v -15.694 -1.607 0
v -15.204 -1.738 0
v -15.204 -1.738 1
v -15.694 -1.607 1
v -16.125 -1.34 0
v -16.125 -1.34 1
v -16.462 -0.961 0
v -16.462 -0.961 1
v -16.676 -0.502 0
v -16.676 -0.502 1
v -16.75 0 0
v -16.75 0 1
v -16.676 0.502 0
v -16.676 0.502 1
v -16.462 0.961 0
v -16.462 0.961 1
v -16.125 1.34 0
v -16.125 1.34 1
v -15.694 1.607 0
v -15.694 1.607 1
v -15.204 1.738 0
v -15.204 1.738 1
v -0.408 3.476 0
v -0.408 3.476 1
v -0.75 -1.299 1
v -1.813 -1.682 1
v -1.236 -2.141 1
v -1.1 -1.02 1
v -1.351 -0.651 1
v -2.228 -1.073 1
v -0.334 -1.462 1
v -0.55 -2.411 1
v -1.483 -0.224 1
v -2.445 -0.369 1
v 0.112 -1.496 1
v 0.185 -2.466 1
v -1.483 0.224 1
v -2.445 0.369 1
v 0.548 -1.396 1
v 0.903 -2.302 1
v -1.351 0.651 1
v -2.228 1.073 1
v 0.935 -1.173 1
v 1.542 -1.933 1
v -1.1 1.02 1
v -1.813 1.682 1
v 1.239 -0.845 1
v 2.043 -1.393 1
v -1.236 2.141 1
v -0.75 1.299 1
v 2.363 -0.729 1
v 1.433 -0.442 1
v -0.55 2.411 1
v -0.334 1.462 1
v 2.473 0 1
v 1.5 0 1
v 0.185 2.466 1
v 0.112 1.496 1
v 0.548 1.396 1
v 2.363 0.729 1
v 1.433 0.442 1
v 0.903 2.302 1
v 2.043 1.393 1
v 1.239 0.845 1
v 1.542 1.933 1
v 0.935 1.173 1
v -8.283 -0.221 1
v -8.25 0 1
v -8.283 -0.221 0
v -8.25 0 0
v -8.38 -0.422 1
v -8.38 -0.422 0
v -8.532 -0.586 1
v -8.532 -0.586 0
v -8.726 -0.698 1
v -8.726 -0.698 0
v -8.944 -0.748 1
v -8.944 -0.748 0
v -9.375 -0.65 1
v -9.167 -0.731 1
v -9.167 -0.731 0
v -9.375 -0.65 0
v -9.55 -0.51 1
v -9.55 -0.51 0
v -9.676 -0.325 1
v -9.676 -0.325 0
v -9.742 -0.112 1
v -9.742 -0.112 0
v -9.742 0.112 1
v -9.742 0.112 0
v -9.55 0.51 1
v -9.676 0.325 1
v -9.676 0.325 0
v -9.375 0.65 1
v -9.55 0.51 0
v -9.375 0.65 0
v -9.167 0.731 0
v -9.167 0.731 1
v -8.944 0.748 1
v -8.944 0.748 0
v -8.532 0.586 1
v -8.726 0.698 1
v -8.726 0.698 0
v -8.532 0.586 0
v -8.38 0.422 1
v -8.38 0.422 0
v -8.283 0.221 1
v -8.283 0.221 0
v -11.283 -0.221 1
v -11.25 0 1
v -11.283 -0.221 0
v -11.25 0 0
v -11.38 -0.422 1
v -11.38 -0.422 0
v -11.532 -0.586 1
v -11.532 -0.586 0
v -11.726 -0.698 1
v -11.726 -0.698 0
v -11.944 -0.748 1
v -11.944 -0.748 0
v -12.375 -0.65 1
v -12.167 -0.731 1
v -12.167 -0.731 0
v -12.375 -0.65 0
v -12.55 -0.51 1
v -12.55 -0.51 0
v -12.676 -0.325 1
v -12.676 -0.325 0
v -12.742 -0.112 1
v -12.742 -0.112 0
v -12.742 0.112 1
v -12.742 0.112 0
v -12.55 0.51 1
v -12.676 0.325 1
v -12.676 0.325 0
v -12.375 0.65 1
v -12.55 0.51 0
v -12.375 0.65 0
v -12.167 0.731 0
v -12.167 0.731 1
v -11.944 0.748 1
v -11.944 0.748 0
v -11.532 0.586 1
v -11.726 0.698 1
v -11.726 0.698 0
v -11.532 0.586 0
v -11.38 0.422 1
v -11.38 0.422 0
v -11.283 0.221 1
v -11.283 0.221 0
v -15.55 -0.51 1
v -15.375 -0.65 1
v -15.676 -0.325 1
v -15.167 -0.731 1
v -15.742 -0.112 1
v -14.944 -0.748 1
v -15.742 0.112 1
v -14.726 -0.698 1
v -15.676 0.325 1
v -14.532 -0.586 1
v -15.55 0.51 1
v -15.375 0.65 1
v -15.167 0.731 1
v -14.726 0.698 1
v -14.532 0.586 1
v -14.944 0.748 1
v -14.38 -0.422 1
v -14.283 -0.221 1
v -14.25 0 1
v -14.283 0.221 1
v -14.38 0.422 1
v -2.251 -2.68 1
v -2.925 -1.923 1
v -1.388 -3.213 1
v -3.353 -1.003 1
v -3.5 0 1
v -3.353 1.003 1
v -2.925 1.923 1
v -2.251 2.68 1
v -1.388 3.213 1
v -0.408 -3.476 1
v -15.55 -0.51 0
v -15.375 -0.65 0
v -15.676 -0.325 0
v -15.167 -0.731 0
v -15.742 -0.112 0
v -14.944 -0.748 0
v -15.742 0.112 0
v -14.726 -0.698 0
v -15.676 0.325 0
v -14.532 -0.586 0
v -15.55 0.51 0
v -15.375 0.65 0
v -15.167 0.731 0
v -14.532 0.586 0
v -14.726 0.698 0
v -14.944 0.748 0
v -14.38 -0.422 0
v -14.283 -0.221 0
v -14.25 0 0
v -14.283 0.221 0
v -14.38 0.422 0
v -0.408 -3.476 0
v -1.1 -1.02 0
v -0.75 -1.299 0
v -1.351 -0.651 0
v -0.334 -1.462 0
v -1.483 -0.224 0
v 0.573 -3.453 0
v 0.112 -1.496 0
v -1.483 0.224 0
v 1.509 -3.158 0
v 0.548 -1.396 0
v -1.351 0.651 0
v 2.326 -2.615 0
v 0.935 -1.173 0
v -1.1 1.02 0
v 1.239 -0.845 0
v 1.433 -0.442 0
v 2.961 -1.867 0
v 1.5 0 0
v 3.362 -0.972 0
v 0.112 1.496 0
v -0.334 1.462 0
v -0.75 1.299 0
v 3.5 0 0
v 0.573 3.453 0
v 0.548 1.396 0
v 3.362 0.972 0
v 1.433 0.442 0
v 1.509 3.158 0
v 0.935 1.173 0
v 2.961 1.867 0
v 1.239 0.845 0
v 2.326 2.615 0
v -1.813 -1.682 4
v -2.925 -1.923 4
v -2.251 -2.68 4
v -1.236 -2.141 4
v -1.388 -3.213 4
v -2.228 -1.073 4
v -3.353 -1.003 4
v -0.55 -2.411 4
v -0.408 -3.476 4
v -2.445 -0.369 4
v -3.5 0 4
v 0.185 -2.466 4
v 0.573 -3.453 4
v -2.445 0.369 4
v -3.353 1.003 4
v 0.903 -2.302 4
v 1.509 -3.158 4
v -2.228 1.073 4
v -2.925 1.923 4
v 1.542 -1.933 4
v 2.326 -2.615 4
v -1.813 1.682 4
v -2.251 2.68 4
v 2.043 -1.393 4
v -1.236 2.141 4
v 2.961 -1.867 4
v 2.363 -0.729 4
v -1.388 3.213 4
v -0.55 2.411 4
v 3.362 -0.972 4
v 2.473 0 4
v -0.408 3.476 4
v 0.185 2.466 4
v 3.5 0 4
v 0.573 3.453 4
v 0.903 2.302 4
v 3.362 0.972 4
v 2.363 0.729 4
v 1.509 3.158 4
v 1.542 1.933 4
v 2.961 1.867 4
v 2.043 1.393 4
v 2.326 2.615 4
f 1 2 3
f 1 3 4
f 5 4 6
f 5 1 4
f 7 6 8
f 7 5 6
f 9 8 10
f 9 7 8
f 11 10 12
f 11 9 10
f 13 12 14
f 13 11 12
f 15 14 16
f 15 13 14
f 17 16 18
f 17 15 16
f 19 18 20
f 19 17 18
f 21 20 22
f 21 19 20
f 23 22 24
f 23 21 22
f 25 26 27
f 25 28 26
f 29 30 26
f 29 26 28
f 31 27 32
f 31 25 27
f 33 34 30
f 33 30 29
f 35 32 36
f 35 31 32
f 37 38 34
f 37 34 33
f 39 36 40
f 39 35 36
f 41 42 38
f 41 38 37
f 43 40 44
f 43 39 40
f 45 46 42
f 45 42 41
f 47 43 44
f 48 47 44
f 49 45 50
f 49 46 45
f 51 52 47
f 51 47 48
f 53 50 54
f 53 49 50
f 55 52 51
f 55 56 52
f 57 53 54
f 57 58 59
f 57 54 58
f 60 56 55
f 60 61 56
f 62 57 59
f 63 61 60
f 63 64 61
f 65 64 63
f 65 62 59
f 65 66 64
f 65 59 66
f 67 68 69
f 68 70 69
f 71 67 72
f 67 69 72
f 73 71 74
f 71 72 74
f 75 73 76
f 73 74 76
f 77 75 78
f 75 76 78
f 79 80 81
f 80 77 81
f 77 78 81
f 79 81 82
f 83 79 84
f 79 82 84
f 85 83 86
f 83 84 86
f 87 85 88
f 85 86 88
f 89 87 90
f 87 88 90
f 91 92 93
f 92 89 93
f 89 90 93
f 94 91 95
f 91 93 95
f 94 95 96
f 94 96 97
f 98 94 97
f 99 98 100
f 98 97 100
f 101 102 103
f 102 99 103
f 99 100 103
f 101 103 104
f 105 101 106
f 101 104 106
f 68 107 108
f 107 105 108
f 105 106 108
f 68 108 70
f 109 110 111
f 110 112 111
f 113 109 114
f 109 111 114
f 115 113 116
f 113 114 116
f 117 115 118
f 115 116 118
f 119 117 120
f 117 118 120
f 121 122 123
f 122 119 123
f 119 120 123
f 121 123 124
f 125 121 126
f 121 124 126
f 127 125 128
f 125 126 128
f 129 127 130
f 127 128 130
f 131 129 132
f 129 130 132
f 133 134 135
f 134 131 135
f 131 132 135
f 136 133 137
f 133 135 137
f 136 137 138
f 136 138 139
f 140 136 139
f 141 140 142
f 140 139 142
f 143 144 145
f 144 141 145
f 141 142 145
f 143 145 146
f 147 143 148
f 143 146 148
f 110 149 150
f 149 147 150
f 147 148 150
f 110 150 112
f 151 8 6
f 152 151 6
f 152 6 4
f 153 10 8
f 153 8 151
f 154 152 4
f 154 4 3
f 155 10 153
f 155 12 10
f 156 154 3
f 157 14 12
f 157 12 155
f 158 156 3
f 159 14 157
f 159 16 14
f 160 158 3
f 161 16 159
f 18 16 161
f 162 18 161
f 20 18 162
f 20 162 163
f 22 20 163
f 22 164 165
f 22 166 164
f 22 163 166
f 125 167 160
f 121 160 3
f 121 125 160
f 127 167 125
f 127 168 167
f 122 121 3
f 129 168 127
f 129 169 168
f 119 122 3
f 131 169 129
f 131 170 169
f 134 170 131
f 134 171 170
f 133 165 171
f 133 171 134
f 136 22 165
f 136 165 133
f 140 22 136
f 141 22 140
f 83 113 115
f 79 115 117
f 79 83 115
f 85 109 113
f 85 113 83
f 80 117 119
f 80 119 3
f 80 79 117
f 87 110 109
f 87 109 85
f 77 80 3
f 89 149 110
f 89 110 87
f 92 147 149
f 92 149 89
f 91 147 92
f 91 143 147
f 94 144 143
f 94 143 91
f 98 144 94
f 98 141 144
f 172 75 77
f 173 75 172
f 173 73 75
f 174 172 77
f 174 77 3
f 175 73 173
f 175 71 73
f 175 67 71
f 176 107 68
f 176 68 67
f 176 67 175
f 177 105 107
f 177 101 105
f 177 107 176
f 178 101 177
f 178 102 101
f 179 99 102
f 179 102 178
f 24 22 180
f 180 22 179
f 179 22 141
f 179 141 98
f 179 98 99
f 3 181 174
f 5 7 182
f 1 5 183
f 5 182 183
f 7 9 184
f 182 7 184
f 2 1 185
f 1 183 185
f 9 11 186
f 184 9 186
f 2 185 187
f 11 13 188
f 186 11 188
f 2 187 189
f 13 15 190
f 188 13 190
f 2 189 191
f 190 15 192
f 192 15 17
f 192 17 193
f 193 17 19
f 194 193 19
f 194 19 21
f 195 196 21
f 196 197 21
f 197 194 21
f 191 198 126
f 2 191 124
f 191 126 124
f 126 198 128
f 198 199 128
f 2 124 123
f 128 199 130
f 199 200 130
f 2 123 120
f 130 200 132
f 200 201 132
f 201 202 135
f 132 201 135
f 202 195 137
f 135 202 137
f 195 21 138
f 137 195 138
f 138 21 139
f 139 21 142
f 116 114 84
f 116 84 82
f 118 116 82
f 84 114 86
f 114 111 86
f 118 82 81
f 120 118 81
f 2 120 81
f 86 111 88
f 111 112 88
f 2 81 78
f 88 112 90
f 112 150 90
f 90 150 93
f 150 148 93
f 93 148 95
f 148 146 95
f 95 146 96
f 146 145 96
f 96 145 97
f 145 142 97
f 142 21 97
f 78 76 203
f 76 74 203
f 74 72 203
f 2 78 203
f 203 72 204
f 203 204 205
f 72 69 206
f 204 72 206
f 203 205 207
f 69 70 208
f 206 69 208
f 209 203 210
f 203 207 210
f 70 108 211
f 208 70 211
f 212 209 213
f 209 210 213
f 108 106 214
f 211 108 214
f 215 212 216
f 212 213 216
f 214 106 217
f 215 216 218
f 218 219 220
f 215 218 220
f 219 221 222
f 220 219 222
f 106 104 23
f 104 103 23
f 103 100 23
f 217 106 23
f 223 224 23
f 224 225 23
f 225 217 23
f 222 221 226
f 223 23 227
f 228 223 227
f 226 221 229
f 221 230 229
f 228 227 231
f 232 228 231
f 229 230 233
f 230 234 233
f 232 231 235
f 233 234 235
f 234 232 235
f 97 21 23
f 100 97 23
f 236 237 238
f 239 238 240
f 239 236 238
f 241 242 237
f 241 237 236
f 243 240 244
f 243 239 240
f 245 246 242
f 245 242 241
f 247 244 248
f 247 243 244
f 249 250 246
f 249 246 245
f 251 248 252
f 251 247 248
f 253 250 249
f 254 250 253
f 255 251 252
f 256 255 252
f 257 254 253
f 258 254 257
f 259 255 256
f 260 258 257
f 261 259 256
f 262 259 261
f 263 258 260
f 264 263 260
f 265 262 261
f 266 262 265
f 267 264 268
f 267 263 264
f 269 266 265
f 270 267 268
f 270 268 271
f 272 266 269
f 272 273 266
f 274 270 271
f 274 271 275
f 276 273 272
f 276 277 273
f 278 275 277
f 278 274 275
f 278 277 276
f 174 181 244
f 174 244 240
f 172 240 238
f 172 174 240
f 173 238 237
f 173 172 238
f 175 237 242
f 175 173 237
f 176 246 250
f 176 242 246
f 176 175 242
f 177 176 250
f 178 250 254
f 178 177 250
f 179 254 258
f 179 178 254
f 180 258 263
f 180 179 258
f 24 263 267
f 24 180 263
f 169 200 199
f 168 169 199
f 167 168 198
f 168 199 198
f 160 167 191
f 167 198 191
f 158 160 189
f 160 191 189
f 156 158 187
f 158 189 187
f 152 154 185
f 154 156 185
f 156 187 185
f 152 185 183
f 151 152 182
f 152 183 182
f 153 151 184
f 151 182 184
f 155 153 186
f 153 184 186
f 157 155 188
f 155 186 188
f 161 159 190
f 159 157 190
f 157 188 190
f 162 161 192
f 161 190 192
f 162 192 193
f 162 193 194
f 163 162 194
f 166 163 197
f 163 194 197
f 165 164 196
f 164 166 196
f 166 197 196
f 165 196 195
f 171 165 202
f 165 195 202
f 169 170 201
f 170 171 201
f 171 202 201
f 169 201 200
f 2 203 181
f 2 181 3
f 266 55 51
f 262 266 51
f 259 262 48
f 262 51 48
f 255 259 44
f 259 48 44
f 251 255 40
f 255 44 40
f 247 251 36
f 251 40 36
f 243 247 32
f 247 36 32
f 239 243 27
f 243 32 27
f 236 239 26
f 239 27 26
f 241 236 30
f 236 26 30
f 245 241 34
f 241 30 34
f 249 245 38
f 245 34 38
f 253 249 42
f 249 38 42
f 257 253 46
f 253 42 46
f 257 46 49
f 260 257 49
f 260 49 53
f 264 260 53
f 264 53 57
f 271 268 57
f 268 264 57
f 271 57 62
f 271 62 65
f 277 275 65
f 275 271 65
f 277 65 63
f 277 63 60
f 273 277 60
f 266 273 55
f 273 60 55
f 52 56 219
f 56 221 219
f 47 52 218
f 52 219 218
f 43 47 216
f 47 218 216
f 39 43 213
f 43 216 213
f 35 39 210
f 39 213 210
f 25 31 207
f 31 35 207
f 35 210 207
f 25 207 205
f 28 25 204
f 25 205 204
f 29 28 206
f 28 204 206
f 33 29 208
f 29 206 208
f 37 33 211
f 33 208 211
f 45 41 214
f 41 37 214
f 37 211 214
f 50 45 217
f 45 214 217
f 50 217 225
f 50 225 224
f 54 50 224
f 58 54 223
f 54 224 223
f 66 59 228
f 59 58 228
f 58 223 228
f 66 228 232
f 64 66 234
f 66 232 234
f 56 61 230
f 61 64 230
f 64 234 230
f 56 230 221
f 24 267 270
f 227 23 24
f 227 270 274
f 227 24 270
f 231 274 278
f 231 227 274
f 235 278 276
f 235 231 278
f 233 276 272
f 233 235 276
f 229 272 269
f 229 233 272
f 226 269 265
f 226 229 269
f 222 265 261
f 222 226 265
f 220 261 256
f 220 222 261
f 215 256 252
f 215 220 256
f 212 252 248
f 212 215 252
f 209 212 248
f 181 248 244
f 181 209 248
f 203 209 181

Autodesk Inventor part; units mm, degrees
ref_plane "YZ Plane" through (0, 0, 0) normal (1, 0, 0) x (0, 1, 0)
ref_plane "XZ Plane" through (0, 0, 0) normal (0, 1, 0) x (-1, 0, 0)
ref_plane "XY Plane" through (0, 0, 0) normal (0, 0, 1) x (1, 0, 0)
sketch "Sketch1" plane through (0, 0, 0) normal (0, 0, 1) x (1, 0, 0)
  circle A0 centre (0, 0) radius 1.5
  circle A1 centre (-15, 0) radius 0.75
  line L0 (-15, 0) -> (0, 0) construction
  arc A2 (-0.4083, -3.4761) -> (-0.4083, 3.4761) centre (0, 0) ccw
  arc A3 (-15.2042, 1.738) -> (-15.2042, -1.738) centre (-15, 0) ccw
  circle A4 centre (-12, 0) radius 0.75
  circle A5 centre (-9, 0) radius 0.75
  line L1 (-15.2042, 1.738) -> (-0.4083, 3.4761)
  line L2 (-0.4083, -3.4761) -> (-15.2042, -1.738)
  dimension "d0" = 15
  dimension "d1" = 1.5
  dimension "d2" = 3
  dimension "d5" = 3
  dimension "d10" = 1
  dimension "d11" = 2
extrude "Extrusion1" add sketch "Sketch1" along normal blind 1
sketch "Sketch2" plane through (0, 0, 1) normal (0, 0, 1) x (1, 0, 0)
  arc A0 (-0.4083, -3.4761) -> (-0.4083, 3.4761) centre (0, 0) ccw projected
  circle A1 centre (0, 0) radius 3.5
  circle A2 centre (0, 0) radius 2.4727
  point P0 (-0.4083, -3.4761)
extrude "Extrusion2" add sketch "Sketch2" along normal blind 3
properties part number "ServoHorn"
